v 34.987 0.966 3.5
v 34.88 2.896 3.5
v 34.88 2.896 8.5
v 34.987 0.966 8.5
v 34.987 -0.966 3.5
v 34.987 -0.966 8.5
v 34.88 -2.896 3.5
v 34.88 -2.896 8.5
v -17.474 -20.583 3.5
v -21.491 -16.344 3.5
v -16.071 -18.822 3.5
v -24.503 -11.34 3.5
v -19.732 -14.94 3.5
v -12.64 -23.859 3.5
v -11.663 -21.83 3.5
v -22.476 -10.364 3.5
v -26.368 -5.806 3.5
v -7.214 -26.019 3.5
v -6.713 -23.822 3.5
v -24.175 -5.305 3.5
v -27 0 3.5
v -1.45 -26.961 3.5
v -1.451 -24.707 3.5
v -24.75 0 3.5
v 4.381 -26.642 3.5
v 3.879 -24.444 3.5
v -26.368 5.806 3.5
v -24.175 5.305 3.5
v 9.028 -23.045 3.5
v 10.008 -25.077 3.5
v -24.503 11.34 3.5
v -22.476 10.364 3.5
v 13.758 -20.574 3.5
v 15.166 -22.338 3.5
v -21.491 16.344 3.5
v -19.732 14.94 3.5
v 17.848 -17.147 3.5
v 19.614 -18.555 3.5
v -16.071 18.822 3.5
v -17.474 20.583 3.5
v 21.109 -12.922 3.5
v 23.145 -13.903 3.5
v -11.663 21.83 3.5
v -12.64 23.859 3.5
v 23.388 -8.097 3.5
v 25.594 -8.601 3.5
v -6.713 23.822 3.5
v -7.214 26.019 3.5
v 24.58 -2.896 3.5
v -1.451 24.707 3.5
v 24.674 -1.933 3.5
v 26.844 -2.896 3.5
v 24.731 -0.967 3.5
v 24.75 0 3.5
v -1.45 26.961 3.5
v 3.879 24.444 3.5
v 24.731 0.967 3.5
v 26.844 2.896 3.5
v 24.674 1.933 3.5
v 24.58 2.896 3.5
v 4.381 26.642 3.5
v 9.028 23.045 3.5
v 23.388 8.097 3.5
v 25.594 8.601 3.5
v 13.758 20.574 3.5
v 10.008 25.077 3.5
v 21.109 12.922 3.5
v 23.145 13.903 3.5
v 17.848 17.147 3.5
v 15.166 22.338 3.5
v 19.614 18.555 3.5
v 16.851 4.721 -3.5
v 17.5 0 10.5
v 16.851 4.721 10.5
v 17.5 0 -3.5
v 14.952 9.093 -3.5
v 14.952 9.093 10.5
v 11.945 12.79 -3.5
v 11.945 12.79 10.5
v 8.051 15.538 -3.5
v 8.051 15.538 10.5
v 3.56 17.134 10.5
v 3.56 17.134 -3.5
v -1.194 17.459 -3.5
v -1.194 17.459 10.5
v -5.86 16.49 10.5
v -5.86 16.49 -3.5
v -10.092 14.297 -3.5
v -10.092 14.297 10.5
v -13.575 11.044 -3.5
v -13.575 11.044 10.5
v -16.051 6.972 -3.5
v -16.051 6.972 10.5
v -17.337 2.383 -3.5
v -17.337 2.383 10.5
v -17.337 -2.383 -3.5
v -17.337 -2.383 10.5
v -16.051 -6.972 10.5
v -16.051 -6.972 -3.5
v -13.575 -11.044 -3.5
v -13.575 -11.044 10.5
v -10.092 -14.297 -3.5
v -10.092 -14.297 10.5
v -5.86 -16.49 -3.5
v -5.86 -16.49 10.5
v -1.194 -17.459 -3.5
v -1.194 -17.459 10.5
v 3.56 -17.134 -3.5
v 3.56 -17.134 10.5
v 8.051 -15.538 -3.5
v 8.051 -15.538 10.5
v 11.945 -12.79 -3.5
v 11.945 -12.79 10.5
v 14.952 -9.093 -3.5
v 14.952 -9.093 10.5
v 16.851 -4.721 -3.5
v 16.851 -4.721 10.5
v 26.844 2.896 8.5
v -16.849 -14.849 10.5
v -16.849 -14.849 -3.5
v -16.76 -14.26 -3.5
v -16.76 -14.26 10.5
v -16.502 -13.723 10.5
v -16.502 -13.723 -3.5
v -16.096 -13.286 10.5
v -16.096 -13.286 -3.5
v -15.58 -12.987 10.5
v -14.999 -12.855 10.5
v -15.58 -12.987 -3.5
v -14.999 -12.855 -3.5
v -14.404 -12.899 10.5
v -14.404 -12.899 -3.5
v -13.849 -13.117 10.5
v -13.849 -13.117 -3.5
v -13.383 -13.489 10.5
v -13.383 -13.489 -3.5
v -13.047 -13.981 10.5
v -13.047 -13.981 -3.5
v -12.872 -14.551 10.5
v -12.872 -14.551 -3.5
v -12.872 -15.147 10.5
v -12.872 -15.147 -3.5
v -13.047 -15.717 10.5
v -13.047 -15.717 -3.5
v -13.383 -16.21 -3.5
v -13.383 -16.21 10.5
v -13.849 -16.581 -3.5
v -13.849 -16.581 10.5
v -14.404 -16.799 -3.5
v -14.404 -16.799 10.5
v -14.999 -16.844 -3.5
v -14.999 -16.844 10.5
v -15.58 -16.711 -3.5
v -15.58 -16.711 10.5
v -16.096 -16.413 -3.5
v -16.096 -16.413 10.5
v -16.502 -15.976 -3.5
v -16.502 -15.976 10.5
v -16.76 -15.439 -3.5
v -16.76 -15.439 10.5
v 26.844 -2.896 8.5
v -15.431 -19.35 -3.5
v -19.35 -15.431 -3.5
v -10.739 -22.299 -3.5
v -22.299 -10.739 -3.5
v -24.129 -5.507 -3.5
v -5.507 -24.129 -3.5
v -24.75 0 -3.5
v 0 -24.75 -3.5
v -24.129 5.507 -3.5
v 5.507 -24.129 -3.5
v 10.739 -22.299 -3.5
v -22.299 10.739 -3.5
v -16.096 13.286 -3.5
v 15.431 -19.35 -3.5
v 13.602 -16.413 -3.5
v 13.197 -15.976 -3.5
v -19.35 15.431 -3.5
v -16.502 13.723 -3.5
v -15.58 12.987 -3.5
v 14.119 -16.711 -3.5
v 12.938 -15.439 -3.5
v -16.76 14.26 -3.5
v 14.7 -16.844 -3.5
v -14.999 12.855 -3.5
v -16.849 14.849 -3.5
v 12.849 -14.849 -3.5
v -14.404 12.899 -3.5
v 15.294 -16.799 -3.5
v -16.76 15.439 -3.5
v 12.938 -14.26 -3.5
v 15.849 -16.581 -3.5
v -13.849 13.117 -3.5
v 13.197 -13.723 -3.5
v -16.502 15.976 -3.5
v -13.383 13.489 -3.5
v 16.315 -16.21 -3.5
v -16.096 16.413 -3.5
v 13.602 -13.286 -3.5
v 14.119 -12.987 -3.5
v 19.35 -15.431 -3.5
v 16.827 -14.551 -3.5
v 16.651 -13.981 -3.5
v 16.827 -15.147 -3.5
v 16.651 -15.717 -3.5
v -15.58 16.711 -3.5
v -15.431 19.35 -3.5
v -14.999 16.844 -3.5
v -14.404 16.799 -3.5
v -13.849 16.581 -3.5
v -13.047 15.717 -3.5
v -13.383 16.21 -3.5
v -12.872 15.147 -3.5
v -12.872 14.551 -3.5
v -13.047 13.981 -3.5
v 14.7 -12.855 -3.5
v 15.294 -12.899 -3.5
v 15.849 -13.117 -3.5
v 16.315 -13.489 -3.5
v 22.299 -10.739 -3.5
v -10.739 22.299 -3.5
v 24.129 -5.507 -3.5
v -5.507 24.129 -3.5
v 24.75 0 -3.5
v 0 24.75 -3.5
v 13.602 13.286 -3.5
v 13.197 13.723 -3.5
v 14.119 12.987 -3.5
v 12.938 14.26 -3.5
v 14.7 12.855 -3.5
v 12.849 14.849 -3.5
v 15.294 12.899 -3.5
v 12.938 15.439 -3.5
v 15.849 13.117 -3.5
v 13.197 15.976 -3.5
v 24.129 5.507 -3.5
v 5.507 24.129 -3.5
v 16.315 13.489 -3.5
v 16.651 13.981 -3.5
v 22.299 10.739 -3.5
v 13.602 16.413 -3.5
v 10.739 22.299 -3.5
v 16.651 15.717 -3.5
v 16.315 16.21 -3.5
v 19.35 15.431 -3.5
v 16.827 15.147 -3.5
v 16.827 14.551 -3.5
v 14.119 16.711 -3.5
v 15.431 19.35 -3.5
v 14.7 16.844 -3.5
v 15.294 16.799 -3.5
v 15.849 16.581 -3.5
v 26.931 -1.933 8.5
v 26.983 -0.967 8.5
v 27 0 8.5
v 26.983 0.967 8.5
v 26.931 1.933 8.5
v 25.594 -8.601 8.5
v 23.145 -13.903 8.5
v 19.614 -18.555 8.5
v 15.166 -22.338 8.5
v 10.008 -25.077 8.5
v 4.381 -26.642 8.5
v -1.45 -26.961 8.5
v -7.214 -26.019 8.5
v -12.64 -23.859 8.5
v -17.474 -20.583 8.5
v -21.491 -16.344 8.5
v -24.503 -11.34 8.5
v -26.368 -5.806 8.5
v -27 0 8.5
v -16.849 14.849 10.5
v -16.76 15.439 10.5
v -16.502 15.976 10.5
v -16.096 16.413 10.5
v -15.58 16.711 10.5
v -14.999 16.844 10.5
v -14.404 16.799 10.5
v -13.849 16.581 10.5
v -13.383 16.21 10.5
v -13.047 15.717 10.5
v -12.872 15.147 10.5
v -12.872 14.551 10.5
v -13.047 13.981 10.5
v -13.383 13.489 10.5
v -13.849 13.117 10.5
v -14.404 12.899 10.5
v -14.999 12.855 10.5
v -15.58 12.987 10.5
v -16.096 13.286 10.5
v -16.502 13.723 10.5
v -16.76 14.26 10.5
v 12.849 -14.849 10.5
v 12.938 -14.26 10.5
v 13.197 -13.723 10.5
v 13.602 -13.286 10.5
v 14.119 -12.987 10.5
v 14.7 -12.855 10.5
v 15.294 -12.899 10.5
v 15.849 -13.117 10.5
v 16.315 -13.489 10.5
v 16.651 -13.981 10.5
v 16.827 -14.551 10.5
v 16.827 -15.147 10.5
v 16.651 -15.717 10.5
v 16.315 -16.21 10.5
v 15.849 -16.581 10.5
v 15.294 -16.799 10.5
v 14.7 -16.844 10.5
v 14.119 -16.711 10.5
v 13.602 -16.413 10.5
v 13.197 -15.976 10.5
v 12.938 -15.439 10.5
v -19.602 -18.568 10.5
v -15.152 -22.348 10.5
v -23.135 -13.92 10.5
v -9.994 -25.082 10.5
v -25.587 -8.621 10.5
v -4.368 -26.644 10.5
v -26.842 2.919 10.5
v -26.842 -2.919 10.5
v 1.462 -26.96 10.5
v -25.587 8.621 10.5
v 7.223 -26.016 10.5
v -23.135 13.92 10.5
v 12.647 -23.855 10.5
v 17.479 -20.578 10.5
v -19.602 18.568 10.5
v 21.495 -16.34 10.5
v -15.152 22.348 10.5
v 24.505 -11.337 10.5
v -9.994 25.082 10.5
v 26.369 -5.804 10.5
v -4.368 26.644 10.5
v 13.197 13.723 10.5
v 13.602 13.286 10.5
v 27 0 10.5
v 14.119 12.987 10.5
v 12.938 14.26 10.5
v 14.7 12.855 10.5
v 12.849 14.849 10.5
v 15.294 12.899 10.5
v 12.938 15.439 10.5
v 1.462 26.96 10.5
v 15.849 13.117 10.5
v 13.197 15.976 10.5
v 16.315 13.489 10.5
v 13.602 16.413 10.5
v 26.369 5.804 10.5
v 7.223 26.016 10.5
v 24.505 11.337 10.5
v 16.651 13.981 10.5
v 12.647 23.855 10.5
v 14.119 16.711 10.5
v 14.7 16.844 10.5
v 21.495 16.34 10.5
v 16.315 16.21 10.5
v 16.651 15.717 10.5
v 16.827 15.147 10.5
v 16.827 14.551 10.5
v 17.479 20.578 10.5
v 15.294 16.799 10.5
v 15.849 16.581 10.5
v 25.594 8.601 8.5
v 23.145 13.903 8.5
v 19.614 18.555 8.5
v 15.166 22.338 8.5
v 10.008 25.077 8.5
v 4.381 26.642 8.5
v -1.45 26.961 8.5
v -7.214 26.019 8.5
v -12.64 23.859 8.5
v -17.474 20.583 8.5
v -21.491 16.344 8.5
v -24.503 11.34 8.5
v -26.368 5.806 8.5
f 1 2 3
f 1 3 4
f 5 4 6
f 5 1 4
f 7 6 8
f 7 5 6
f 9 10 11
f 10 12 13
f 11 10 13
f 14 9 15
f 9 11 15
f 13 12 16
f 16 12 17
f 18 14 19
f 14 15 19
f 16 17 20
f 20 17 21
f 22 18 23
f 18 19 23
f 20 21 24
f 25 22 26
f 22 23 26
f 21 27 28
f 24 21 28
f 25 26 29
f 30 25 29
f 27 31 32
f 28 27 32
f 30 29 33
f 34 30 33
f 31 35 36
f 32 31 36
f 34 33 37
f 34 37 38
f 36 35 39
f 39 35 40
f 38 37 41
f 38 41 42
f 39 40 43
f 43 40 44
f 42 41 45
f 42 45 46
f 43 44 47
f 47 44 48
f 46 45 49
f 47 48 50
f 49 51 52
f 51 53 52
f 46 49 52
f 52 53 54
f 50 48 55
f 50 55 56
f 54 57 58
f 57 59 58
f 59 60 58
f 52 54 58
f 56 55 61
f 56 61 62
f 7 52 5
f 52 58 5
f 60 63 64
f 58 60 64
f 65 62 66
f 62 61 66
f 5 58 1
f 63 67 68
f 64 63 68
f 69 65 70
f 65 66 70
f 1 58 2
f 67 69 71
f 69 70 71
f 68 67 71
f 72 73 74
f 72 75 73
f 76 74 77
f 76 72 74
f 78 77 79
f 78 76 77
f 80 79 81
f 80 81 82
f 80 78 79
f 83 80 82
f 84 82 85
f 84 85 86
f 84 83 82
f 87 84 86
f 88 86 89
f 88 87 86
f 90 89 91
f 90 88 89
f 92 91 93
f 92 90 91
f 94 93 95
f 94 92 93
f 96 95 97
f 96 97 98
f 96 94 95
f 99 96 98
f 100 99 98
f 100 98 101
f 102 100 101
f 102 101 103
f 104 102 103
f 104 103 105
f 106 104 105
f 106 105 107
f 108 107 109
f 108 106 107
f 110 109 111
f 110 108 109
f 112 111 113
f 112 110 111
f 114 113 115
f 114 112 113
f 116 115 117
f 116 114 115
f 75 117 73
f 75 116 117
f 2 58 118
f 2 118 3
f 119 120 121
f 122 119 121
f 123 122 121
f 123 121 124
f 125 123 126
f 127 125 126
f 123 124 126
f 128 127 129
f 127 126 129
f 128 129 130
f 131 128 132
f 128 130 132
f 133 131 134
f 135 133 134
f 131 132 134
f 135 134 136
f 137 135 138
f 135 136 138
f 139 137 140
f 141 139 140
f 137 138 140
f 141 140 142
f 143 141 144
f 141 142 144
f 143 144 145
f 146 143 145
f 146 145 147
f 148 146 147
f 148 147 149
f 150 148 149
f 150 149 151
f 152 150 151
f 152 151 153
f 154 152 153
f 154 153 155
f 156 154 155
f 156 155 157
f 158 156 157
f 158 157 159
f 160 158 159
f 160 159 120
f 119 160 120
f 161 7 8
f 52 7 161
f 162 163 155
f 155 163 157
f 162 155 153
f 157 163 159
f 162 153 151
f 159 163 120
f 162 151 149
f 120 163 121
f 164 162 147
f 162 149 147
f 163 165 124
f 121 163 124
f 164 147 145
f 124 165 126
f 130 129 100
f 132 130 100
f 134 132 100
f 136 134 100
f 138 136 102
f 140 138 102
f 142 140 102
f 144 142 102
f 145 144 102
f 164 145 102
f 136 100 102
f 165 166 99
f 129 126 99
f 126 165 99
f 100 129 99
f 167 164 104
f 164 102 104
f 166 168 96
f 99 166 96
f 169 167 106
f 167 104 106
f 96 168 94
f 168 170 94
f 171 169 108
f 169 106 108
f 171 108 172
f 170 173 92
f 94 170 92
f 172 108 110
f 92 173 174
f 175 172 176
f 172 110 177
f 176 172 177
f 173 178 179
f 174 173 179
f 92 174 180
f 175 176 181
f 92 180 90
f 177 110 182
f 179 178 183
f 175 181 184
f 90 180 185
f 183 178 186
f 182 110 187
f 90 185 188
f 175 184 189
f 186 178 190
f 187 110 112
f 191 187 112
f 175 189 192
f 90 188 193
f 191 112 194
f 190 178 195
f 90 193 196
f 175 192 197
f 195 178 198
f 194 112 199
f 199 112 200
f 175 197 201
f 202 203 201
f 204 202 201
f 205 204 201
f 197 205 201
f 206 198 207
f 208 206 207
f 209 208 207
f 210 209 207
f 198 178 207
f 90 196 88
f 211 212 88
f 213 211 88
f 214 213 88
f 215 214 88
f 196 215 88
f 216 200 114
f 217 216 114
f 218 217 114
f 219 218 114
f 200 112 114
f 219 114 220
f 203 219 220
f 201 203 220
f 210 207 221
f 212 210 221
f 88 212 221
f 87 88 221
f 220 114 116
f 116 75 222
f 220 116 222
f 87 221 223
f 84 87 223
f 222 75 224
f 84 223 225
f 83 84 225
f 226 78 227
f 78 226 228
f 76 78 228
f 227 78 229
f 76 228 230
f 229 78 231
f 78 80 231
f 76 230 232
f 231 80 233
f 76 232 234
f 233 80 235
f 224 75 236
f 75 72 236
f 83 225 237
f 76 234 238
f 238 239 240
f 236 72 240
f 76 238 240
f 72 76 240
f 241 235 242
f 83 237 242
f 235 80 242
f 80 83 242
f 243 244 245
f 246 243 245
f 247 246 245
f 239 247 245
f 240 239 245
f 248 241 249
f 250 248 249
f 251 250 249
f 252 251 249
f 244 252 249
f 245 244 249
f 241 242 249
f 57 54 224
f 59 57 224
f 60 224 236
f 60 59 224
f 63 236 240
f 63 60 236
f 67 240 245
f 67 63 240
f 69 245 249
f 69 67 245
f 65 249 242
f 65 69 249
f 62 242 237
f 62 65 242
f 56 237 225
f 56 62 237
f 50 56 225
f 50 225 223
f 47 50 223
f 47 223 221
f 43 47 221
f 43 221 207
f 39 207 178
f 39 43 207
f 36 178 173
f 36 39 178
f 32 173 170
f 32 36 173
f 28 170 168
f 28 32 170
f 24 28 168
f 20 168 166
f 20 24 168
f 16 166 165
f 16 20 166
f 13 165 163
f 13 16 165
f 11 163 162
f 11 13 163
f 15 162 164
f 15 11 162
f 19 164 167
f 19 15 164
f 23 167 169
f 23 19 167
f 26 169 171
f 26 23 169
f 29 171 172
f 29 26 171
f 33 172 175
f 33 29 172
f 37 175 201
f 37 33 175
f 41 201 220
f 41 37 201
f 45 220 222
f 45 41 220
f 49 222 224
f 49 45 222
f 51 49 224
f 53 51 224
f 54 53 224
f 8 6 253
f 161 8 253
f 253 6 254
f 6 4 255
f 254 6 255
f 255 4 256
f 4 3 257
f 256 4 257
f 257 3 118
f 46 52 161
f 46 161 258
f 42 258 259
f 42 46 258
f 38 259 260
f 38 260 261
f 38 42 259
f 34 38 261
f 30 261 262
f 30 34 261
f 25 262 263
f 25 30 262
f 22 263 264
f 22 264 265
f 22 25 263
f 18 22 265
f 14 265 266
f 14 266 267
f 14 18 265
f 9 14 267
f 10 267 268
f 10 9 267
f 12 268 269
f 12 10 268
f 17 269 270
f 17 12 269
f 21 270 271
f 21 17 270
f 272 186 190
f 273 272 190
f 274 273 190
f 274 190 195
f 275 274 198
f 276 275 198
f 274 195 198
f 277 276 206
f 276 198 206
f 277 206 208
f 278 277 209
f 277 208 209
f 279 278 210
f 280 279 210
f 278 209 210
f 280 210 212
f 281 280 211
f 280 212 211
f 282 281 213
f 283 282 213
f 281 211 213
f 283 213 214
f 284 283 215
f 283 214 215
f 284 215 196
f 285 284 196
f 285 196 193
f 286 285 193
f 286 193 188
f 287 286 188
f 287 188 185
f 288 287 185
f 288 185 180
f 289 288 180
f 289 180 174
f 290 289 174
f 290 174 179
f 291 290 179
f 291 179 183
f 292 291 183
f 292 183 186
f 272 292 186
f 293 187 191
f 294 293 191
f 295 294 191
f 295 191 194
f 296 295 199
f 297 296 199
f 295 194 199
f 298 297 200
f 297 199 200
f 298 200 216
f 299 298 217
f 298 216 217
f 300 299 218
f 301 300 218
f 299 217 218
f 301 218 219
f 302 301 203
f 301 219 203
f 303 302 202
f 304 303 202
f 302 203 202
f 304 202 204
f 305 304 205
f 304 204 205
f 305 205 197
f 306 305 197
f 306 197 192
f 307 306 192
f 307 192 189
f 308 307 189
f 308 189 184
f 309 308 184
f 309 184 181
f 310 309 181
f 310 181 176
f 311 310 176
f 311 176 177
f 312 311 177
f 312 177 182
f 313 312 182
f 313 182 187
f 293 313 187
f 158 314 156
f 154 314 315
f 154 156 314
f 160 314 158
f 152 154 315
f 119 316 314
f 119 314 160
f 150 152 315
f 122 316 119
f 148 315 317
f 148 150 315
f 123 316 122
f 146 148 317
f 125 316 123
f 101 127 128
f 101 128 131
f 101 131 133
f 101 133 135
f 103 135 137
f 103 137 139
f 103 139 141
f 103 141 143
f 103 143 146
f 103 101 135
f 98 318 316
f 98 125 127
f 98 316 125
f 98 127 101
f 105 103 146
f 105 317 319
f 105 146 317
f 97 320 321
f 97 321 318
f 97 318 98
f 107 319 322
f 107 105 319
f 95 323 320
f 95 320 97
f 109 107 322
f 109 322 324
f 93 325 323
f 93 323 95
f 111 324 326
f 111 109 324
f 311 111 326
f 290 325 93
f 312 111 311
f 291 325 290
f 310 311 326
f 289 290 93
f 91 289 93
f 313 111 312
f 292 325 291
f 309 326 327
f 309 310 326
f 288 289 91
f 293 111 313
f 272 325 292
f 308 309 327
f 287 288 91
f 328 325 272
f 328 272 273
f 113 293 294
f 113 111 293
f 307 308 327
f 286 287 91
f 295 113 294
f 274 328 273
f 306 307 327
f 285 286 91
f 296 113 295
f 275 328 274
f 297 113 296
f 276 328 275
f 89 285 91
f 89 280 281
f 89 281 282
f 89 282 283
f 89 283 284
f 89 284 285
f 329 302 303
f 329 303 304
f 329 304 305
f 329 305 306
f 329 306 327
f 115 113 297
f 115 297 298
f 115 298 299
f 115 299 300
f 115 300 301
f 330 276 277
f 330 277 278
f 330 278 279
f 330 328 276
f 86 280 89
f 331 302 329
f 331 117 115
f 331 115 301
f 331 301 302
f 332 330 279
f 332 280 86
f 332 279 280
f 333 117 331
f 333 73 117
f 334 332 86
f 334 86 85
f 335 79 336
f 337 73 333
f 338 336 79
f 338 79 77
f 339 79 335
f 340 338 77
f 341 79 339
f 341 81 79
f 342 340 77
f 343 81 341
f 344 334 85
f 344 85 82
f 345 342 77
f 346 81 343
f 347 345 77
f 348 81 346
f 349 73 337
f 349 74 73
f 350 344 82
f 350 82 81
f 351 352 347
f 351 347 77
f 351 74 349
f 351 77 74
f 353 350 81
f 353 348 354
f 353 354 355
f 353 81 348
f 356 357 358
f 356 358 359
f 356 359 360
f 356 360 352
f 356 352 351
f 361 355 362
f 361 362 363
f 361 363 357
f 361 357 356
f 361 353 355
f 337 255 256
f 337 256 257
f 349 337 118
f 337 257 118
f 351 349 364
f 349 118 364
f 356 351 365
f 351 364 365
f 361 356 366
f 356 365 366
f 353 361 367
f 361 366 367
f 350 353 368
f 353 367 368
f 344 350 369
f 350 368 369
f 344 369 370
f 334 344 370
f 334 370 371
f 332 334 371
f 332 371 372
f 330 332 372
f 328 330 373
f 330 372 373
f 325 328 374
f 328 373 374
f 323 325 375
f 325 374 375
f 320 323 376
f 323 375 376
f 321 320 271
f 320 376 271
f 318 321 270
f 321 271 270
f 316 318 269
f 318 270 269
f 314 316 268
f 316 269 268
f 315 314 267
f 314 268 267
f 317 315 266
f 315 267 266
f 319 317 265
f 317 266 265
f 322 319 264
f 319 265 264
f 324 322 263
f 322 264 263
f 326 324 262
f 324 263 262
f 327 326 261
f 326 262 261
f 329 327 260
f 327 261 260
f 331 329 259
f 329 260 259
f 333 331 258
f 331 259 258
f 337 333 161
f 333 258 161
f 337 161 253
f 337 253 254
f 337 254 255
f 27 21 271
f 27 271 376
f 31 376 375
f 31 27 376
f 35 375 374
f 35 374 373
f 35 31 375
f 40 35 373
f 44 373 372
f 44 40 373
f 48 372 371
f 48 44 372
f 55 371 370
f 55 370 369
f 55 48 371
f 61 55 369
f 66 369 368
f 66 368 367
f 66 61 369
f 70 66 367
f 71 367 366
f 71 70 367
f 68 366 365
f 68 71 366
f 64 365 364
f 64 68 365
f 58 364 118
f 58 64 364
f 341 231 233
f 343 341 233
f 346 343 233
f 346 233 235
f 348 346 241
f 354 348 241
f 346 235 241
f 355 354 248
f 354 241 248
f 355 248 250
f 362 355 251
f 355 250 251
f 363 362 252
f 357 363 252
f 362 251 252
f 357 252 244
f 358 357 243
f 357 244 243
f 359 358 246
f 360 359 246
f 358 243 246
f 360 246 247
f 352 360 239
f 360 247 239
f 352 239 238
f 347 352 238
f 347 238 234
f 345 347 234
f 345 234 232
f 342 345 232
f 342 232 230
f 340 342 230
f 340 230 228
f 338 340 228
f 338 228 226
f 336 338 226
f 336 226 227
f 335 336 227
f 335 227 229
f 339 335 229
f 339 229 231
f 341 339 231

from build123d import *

# Parameters (mm, degrees)
SKETCH_1_R          = 24.75
SKETCH_1_R_2        = 17.5
EXTRUDE_1_DEPTH     = 3.5
SKETCH_2_R          = 27
SKETCH_2_R_2        = 17.5
EXTRUDE_2_DEPTH     = 7
SKETCH_3_R          = 2
CUT_EXTRUDE_1_DEPTH = 15
EXTRUDE_3_DEPTH     = 5


with BuildPart() as part:
    # 草图1 → 凸台-拉伸1 (new, symmetric)
    with BuildSketch(Plane.XY):
        Circle(SKETCH_1_R)
        Circle(SKETCH_1_R_2, mode=Mode.SUBTRACT)
    extrude(amount=EXTRUDE_1_DEPTH, both=True)

    # 草图2 → 凸台-拉伸2 (add)
    with BuildSketch(Plane.XY.offset(3.5)):
        Circle(SKETCH_2_R)
        Circle(SKETCH_2_R_2, mode=Mode.SUBTRACT)
    extrude(amount=EXTRUDE_2_DEPTH)

    # 草图3 → 切除-拉伸1 (cut)
    with BuildSketch(Plane(origin=(0, 0, -3.5), x_dir=(-1, 0, 0), z_dir=(0, 0, -1))):
        with Locations((14.849242405, 14.849242405)):
            Circle(SKETCH_3_R)
        with Locations((14.849242405, -14.849242405)):
            Circle(SKETCH_3_R)
        with Locations((-14.849242405, -14.849242405)):
            Circle(SKETCH_3_R)
        with Locations((-14.849242405, 14.849242405)):
            Circle(SKETCH_3_R)
    extrude(amount=-CUT_EXTRUDE_1_DEPTH, mode=Mode.SUBTRACT)

    # 草图4 → 凸台-拉伸3 (add)
    with BuildSketch(Plane(origin=(0, 0, 3.5), x_dir=(-1, 0, 0), z_dir=(0, 0, -1))):
        with BuildLine():
            ThreePointArc((27, 0), (1.450134249, 26.961029481), (-26.844230419, 2.896082389))
            Line((-26.844230419, 2.896082389), (-24.579975728, 2.896082389))
            ThreePointArc((-24.579975728, 2.896082389), (1.45053451, 24.707457369), (24.75, 0))
            ThreePointArc((24.75, 0), (1.45053451, -24.707457369), (-24.579975728, -2.896082389))
            Line((-24.579975728, -2.896082389), (-26.844230419, -2.896082389))
            ThreePointArc((-26.844230419, -2.896082389), (1.450134249, -26.961029481), (27, 0))
        make_face()
        with BuildLine():
            Line((-24.579975728, 2.896082389), (-26.844230419, 2.896082389))
            ThreePointArc((-26.844230419, 2.896082389), (-27, 0), (-26.844230419, -2.896082389))
            Line((-26.844230419, -2.896082389), (-24.579975728, -2.896082389))
            ThreePointArc((-24.579975728, -2.896082389), (-24.75, 0), (-24.579975728, 2.896082389))
        make_face()
        with BuildLine():
            Line((-26.844230419, 2.896082389), (-34.879975728, 2.896082389))
            ThreePointArc((-34.879975728, 2.896082389), (-35, 0), (-34.879975728, -2.896082389))
            Line((-34.879975728, -2.896082389), (-26.844230419, -2.896082389))
            ThreePointArc((-26.844230419, -2.896082389), (-27, 0), (-26.844230419, 2.896082389))
        make_face()
    extrude(amount=-EXTRUDE_3_DEPTH)


solid = part.part
